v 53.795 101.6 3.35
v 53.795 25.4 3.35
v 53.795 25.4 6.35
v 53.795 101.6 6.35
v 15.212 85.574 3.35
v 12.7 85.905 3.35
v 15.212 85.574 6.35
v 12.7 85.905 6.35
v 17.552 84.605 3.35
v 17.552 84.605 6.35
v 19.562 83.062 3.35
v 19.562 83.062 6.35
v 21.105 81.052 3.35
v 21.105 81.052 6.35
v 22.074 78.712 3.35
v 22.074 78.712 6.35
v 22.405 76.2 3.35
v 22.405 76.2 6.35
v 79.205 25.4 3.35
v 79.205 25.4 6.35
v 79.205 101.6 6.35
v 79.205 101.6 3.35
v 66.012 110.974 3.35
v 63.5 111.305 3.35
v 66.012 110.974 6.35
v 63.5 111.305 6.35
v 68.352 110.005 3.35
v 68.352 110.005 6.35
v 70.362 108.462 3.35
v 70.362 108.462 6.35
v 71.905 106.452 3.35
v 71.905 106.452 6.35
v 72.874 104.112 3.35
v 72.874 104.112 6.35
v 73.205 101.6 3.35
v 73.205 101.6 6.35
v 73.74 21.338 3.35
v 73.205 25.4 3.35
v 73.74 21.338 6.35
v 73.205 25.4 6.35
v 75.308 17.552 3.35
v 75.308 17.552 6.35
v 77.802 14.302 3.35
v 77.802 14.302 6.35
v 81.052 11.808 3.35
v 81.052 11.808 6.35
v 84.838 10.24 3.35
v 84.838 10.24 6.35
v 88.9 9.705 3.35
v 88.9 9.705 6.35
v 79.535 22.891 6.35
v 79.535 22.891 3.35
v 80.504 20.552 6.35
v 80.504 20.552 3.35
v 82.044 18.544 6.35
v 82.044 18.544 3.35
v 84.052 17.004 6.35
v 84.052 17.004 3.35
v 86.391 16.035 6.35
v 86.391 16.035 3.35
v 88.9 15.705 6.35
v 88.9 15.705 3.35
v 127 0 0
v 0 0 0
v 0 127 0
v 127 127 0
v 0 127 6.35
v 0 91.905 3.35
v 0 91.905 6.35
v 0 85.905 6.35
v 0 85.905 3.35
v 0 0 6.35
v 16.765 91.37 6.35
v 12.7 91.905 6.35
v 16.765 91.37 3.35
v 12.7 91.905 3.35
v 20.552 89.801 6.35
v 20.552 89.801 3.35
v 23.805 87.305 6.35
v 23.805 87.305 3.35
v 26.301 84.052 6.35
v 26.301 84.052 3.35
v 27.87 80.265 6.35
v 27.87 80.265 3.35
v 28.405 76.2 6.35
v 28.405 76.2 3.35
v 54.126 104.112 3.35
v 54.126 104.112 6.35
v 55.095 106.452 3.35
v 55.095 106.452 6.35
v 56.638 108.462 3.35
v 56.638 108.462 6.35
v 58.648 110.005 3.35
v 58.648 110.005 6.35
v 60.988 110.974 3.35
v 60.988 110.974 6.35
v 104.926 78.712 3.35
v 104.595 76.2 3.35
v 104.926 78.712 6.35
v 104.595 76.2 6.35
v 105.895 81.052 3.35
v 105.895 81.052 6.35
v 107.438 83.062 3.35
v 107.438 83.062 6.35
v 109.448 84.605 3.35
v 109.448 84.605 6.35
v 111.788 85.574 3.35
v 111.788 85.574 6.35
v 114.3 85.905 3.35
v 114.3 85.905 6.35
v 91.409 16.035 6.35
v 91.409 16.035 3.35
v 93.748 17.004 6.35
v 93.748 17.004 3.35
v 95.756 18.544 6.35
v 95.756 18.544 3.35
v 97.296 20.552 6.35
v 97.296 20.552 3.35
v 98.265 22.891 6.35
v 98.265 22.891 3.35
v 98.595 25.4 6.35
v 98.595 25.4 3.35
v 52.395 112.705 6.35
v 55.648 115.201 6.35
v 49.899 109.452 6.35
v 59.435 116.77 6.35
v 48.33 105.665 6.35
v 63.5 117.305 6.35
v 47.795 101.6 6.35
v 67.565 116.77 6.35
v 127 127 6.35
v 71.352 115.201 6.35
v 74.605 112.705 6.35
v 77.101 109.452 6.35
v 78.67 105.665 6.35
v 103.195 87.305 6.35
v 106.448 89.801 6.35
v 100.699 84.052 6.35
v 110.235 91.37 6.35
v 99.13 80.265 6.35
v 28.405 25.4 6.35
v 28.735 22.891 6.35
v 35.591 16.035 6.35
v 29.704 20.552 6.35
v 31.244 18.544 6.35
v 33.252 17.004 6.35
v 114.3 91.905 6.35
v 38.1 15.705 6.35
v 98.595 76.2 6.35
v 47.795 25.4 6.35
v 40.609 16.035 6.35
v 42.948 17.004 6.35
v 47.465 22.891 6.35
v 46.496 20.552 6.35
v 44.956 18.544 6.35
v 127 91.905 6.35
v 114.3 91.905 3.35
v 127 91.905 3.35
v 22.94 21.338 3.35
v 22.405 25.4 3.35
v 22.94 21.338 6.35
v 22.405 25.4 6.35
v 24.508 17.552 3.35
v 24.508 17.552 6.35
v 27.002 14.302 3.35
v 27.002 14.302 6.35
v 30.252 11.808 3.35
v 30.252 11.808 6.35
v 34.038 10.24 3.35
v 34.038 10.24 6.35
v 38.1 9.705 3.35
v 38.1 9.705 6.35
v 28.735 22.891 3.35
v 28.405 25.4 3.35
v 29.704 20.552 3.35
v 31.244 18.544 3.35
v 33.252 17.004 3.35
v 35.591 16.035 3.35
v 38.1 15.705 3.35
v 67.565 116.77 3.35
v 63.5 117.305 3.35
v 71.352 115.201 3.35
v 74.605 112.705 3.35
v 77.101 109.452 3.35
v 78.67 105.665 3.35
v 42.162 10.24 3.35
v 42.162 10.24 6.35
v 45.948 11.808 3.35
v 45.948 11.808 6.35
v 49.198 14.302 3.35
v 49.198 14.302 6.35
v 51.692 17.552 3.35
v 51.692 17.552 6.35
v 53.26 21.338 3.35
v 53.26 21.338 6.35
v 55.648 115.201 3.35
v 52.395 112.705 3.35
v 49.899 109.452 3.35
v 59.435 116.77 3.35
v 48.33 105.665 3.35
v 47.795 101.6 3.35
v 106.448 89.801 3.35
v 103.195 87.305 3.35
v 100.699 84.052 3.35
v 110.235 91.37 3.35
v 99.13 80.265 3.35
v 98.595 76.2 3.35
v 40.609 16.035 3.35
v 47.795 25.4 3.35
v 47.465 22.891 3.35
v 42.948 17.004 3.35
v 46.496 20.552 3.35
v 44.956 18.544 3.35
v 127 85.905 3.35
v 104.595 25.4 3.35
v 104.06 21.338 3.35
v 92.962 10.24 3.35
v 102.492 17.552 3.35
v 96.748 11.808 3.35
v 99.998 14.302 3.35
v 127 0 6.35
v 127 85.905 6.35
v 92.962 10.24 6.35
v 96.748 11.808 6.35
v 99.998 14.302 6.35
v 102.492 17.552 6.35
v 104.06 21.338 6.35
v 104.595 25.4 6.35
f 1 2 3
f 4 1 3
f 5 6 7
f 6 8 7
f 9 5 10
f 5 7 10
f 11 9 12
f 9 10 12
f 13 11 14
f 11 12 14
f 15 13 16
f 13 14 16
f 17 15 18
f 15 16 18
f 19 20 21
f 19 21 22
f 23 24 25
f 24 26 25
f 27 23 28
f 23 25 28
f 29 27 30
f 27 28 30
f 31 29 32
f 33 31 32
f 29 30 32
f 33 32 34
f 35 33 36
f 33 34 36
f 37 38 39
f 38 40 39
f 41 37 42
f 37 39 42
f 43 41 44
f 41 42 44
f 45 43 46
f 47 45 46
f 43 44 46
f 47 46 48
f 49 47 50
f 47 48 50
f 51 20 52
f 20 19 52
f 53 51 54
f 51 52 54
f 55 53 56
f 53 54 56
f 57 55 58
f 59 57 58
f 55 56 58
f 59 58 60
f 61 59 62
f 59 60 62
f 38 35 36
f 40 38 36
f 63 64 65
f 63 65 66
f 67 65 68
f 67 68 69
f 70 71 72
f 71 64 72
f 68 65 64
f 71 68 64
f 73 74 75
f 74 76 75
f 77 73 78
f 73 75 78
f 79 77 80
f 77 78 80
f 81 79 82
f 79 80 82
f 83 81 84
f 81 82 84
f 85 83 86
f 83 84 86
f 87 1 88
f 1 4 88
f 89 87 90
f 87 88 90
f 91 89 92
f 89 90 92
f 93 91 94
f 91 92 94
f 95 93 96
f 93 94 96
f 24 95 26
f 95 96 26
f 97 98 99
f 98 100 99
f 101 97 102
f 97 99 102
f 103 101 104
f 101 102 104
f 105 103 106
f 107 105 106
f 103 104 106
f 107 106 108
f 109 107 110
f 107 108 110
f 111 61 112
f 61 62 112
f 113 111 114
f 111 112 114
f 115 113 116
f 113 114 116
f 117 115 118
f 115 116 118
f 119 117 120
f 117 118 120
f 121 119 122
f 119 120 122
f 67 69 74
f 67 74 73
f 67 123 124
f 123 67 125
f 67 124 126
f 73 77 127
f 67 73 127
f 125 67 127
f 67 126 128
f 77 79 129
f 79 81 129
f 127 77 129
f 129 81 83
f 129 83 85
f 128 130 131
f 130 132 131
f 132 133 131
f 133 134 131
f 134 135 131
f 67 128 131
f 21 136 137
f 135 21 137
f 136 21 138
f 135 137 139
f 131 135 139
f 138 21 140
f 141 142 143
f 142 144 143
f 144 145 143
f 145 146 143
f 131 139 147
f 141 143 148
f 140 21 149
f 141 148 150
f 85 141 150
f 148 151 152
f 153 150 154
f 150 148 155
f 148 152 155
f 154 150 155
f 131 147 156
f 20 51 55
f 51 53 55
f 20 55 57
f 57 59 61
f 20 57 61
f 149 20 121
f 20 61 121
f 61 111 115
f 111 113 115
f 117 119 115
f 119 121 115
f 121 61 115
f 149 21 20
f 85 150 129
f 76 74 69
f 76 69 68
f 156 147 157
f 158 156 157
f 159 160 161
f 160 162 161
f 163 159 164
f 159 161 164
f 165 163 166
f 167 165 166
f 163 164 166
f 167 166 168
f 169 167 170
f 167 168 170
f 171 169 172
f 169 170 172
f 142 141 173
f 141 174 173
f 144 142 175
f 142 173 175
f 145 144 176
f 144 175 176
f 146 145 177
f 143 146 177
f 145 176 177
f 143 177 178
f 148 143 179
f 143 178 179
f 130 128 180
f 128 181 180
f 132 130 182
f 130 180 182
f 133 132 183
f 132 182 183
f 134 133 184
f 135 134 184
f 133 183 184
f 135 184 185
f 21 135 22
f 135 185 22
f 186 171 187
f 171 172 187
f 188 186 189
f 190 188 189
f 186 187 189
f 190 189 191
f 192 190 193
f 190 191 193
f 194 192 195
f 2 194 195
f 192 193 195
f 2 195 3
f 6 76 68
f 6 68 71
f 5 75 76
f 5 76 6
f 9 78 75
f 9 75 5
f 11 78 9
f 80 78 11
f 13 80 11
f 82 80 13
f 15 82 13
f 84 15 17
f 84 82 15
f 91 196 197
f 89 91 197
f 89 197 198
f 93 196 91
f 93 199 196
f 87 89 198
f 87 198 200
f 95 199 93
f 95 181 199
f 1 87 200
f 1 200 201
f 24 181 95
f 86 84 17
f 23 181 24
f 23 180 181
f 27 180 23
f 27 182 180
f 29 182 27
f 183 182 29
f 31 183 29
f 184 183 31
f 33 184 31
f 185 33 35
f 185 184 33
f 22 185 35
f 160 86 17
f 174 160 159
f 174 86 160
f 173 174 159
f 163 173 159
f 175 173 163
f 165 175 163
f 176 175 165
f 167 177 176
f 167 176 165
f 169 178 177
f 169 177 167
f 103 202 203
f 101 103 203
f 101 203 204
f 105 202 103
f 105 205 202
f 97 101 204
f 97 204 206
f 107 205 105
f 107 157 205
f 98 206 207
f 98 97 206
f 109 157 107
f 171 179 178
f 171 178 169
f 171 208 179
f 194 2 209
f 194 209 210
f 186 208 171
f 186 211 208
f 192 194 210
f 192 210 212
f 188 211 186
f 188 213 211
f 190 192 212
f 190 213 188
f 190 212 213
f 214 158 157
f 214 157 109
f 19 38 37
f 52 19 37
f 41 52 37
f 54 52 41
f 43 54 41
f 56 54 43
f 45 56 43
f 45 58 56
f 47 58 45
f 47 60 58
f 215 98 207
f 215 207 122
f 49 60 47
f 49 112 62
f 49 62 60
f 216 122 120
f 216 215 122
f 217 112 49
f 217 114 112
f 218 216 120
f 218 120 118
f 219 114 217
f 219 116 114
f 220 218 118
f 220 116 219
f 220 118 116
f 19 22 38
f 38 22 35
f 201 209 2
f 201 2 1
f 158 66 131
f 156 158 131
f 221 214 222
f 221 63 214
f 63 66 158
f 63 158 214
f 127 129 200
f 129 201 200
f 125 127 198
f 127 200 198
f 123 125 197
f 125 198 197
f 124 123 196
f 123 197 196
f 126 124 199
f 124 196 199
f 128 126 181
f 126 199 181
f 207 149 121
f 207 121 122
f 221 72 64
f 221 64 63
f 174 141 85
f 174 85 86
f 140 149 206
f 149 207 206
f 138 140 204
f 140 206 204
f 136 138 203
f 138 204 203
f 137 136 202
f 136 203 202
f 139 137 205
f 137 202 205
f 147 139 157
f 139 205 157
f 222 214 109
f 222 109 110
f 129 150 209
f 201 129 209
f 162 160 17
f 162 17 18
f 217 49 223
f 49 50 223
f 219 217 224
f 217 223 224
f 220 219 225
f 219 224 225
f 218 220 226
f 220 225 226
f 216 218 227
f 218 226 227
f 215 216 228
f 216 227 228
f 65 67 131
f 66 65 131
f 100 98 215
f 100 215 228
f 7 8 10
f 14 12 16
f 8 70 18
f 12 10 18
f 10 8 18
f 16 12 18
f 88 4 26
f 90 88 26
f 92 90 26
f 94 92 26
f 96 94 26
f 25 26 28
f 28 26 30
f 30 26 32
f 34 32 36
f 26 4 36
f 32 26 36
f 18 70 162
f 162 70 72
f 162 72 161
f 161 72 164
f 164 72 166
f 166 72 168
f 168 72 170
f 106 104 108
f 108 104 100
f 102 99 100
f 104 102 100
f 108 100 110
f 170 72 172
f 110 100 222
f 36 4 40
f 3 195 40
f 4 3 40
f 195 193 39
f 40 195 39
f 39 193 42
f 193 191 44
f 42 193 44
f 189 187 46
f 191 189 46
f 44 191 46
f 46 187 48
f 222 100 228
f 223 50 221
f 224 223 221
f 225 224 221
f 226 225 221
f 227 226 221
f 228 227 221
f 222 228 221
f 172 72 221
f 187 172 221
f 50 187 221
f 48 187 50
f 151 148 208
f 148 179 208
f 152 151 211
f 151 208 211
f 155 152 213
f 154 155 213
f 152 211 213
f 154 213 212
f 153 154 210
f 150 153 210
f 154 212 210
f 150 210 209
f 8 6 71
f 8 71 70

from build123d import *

# Parameters (mm, degrees)
F0_W     = 127
F0_H     = 6.35
F1_DEPTH = 127
F3_W     = 6
F3_H     = 3


with BuildPart() as f1:
    # F0 (on Front) → F1 (new body)
    with BuildSketch(Plane.XZ):
        with Locations((63.5, 3.175)):
            Rectangle(F0_W, F0_H)
    extrude(amount=-F1_DEPTH)

    # F4: sweep along a path in F2
    with BuildLine(Plane.XY.offset(6.35)) as f4_path:
        Line((0, 88.9), (12.7, 88.9))
        ThreePointArc((12.7, 88.9), (21.6802561211, 85.1802561211), (25.4, 76.2))
        Line((25.4, 76.2), (25.4, 25.4))
        ThreePointArc((25.4, 25.4), (29.1197438789, 16.4197438789), (38.1, 12.7))
        ThreePointArc((38.1, 12.7), (47.0802561211, 16.4197438789), (50.8, 25.4))
        Line((50.8, 25.4), (50.8, 76.2))
        Line((50.8, 76.2), (50.8, 101.6))
        ThreePointArc((50.8, 101.6), (54.5197438789, 110.5802561211), (63.5, 114.3))
        ThreePointArc((63.5, 114.3), (72.4802561211, 110.5802561211), (76.2, 101.6))
        Line((76.2, 101.6), (76.2, 76.2))
        Line((76.2, 76.2), (76.2, 25.4))
        ThreePointArc((76.2, 25.4), (79.9197438789, 16.4197438789), (88.9, 12.7))
        ThreePointArc((88.9, 12.7), (97.8802561211, 16.4197438789), (101.6, 25.4))
        Line((101.6, 25.4), (101.6, 76.2))
        ThreePointArc((101.6, 76.2), (105.3197438789, 85.1802561211), (114.3, 88.9))
        Line((114.3, 88.9), (127, 88.9))
    # F3 (on face) → F4 (sweep, cut)
    with BuildSketch(Plane(origin=(0, 0, 0), x_dir=(0, -1, 0), z_dir=(-1, 0, 0))):
        with Locations((-88.9047980309, 4.85)):
            Rectangle(F3_W, F3_H)
    sweep(path=f4_path.line, mode=Mode.SUBTRACT)


solid = f1.part
